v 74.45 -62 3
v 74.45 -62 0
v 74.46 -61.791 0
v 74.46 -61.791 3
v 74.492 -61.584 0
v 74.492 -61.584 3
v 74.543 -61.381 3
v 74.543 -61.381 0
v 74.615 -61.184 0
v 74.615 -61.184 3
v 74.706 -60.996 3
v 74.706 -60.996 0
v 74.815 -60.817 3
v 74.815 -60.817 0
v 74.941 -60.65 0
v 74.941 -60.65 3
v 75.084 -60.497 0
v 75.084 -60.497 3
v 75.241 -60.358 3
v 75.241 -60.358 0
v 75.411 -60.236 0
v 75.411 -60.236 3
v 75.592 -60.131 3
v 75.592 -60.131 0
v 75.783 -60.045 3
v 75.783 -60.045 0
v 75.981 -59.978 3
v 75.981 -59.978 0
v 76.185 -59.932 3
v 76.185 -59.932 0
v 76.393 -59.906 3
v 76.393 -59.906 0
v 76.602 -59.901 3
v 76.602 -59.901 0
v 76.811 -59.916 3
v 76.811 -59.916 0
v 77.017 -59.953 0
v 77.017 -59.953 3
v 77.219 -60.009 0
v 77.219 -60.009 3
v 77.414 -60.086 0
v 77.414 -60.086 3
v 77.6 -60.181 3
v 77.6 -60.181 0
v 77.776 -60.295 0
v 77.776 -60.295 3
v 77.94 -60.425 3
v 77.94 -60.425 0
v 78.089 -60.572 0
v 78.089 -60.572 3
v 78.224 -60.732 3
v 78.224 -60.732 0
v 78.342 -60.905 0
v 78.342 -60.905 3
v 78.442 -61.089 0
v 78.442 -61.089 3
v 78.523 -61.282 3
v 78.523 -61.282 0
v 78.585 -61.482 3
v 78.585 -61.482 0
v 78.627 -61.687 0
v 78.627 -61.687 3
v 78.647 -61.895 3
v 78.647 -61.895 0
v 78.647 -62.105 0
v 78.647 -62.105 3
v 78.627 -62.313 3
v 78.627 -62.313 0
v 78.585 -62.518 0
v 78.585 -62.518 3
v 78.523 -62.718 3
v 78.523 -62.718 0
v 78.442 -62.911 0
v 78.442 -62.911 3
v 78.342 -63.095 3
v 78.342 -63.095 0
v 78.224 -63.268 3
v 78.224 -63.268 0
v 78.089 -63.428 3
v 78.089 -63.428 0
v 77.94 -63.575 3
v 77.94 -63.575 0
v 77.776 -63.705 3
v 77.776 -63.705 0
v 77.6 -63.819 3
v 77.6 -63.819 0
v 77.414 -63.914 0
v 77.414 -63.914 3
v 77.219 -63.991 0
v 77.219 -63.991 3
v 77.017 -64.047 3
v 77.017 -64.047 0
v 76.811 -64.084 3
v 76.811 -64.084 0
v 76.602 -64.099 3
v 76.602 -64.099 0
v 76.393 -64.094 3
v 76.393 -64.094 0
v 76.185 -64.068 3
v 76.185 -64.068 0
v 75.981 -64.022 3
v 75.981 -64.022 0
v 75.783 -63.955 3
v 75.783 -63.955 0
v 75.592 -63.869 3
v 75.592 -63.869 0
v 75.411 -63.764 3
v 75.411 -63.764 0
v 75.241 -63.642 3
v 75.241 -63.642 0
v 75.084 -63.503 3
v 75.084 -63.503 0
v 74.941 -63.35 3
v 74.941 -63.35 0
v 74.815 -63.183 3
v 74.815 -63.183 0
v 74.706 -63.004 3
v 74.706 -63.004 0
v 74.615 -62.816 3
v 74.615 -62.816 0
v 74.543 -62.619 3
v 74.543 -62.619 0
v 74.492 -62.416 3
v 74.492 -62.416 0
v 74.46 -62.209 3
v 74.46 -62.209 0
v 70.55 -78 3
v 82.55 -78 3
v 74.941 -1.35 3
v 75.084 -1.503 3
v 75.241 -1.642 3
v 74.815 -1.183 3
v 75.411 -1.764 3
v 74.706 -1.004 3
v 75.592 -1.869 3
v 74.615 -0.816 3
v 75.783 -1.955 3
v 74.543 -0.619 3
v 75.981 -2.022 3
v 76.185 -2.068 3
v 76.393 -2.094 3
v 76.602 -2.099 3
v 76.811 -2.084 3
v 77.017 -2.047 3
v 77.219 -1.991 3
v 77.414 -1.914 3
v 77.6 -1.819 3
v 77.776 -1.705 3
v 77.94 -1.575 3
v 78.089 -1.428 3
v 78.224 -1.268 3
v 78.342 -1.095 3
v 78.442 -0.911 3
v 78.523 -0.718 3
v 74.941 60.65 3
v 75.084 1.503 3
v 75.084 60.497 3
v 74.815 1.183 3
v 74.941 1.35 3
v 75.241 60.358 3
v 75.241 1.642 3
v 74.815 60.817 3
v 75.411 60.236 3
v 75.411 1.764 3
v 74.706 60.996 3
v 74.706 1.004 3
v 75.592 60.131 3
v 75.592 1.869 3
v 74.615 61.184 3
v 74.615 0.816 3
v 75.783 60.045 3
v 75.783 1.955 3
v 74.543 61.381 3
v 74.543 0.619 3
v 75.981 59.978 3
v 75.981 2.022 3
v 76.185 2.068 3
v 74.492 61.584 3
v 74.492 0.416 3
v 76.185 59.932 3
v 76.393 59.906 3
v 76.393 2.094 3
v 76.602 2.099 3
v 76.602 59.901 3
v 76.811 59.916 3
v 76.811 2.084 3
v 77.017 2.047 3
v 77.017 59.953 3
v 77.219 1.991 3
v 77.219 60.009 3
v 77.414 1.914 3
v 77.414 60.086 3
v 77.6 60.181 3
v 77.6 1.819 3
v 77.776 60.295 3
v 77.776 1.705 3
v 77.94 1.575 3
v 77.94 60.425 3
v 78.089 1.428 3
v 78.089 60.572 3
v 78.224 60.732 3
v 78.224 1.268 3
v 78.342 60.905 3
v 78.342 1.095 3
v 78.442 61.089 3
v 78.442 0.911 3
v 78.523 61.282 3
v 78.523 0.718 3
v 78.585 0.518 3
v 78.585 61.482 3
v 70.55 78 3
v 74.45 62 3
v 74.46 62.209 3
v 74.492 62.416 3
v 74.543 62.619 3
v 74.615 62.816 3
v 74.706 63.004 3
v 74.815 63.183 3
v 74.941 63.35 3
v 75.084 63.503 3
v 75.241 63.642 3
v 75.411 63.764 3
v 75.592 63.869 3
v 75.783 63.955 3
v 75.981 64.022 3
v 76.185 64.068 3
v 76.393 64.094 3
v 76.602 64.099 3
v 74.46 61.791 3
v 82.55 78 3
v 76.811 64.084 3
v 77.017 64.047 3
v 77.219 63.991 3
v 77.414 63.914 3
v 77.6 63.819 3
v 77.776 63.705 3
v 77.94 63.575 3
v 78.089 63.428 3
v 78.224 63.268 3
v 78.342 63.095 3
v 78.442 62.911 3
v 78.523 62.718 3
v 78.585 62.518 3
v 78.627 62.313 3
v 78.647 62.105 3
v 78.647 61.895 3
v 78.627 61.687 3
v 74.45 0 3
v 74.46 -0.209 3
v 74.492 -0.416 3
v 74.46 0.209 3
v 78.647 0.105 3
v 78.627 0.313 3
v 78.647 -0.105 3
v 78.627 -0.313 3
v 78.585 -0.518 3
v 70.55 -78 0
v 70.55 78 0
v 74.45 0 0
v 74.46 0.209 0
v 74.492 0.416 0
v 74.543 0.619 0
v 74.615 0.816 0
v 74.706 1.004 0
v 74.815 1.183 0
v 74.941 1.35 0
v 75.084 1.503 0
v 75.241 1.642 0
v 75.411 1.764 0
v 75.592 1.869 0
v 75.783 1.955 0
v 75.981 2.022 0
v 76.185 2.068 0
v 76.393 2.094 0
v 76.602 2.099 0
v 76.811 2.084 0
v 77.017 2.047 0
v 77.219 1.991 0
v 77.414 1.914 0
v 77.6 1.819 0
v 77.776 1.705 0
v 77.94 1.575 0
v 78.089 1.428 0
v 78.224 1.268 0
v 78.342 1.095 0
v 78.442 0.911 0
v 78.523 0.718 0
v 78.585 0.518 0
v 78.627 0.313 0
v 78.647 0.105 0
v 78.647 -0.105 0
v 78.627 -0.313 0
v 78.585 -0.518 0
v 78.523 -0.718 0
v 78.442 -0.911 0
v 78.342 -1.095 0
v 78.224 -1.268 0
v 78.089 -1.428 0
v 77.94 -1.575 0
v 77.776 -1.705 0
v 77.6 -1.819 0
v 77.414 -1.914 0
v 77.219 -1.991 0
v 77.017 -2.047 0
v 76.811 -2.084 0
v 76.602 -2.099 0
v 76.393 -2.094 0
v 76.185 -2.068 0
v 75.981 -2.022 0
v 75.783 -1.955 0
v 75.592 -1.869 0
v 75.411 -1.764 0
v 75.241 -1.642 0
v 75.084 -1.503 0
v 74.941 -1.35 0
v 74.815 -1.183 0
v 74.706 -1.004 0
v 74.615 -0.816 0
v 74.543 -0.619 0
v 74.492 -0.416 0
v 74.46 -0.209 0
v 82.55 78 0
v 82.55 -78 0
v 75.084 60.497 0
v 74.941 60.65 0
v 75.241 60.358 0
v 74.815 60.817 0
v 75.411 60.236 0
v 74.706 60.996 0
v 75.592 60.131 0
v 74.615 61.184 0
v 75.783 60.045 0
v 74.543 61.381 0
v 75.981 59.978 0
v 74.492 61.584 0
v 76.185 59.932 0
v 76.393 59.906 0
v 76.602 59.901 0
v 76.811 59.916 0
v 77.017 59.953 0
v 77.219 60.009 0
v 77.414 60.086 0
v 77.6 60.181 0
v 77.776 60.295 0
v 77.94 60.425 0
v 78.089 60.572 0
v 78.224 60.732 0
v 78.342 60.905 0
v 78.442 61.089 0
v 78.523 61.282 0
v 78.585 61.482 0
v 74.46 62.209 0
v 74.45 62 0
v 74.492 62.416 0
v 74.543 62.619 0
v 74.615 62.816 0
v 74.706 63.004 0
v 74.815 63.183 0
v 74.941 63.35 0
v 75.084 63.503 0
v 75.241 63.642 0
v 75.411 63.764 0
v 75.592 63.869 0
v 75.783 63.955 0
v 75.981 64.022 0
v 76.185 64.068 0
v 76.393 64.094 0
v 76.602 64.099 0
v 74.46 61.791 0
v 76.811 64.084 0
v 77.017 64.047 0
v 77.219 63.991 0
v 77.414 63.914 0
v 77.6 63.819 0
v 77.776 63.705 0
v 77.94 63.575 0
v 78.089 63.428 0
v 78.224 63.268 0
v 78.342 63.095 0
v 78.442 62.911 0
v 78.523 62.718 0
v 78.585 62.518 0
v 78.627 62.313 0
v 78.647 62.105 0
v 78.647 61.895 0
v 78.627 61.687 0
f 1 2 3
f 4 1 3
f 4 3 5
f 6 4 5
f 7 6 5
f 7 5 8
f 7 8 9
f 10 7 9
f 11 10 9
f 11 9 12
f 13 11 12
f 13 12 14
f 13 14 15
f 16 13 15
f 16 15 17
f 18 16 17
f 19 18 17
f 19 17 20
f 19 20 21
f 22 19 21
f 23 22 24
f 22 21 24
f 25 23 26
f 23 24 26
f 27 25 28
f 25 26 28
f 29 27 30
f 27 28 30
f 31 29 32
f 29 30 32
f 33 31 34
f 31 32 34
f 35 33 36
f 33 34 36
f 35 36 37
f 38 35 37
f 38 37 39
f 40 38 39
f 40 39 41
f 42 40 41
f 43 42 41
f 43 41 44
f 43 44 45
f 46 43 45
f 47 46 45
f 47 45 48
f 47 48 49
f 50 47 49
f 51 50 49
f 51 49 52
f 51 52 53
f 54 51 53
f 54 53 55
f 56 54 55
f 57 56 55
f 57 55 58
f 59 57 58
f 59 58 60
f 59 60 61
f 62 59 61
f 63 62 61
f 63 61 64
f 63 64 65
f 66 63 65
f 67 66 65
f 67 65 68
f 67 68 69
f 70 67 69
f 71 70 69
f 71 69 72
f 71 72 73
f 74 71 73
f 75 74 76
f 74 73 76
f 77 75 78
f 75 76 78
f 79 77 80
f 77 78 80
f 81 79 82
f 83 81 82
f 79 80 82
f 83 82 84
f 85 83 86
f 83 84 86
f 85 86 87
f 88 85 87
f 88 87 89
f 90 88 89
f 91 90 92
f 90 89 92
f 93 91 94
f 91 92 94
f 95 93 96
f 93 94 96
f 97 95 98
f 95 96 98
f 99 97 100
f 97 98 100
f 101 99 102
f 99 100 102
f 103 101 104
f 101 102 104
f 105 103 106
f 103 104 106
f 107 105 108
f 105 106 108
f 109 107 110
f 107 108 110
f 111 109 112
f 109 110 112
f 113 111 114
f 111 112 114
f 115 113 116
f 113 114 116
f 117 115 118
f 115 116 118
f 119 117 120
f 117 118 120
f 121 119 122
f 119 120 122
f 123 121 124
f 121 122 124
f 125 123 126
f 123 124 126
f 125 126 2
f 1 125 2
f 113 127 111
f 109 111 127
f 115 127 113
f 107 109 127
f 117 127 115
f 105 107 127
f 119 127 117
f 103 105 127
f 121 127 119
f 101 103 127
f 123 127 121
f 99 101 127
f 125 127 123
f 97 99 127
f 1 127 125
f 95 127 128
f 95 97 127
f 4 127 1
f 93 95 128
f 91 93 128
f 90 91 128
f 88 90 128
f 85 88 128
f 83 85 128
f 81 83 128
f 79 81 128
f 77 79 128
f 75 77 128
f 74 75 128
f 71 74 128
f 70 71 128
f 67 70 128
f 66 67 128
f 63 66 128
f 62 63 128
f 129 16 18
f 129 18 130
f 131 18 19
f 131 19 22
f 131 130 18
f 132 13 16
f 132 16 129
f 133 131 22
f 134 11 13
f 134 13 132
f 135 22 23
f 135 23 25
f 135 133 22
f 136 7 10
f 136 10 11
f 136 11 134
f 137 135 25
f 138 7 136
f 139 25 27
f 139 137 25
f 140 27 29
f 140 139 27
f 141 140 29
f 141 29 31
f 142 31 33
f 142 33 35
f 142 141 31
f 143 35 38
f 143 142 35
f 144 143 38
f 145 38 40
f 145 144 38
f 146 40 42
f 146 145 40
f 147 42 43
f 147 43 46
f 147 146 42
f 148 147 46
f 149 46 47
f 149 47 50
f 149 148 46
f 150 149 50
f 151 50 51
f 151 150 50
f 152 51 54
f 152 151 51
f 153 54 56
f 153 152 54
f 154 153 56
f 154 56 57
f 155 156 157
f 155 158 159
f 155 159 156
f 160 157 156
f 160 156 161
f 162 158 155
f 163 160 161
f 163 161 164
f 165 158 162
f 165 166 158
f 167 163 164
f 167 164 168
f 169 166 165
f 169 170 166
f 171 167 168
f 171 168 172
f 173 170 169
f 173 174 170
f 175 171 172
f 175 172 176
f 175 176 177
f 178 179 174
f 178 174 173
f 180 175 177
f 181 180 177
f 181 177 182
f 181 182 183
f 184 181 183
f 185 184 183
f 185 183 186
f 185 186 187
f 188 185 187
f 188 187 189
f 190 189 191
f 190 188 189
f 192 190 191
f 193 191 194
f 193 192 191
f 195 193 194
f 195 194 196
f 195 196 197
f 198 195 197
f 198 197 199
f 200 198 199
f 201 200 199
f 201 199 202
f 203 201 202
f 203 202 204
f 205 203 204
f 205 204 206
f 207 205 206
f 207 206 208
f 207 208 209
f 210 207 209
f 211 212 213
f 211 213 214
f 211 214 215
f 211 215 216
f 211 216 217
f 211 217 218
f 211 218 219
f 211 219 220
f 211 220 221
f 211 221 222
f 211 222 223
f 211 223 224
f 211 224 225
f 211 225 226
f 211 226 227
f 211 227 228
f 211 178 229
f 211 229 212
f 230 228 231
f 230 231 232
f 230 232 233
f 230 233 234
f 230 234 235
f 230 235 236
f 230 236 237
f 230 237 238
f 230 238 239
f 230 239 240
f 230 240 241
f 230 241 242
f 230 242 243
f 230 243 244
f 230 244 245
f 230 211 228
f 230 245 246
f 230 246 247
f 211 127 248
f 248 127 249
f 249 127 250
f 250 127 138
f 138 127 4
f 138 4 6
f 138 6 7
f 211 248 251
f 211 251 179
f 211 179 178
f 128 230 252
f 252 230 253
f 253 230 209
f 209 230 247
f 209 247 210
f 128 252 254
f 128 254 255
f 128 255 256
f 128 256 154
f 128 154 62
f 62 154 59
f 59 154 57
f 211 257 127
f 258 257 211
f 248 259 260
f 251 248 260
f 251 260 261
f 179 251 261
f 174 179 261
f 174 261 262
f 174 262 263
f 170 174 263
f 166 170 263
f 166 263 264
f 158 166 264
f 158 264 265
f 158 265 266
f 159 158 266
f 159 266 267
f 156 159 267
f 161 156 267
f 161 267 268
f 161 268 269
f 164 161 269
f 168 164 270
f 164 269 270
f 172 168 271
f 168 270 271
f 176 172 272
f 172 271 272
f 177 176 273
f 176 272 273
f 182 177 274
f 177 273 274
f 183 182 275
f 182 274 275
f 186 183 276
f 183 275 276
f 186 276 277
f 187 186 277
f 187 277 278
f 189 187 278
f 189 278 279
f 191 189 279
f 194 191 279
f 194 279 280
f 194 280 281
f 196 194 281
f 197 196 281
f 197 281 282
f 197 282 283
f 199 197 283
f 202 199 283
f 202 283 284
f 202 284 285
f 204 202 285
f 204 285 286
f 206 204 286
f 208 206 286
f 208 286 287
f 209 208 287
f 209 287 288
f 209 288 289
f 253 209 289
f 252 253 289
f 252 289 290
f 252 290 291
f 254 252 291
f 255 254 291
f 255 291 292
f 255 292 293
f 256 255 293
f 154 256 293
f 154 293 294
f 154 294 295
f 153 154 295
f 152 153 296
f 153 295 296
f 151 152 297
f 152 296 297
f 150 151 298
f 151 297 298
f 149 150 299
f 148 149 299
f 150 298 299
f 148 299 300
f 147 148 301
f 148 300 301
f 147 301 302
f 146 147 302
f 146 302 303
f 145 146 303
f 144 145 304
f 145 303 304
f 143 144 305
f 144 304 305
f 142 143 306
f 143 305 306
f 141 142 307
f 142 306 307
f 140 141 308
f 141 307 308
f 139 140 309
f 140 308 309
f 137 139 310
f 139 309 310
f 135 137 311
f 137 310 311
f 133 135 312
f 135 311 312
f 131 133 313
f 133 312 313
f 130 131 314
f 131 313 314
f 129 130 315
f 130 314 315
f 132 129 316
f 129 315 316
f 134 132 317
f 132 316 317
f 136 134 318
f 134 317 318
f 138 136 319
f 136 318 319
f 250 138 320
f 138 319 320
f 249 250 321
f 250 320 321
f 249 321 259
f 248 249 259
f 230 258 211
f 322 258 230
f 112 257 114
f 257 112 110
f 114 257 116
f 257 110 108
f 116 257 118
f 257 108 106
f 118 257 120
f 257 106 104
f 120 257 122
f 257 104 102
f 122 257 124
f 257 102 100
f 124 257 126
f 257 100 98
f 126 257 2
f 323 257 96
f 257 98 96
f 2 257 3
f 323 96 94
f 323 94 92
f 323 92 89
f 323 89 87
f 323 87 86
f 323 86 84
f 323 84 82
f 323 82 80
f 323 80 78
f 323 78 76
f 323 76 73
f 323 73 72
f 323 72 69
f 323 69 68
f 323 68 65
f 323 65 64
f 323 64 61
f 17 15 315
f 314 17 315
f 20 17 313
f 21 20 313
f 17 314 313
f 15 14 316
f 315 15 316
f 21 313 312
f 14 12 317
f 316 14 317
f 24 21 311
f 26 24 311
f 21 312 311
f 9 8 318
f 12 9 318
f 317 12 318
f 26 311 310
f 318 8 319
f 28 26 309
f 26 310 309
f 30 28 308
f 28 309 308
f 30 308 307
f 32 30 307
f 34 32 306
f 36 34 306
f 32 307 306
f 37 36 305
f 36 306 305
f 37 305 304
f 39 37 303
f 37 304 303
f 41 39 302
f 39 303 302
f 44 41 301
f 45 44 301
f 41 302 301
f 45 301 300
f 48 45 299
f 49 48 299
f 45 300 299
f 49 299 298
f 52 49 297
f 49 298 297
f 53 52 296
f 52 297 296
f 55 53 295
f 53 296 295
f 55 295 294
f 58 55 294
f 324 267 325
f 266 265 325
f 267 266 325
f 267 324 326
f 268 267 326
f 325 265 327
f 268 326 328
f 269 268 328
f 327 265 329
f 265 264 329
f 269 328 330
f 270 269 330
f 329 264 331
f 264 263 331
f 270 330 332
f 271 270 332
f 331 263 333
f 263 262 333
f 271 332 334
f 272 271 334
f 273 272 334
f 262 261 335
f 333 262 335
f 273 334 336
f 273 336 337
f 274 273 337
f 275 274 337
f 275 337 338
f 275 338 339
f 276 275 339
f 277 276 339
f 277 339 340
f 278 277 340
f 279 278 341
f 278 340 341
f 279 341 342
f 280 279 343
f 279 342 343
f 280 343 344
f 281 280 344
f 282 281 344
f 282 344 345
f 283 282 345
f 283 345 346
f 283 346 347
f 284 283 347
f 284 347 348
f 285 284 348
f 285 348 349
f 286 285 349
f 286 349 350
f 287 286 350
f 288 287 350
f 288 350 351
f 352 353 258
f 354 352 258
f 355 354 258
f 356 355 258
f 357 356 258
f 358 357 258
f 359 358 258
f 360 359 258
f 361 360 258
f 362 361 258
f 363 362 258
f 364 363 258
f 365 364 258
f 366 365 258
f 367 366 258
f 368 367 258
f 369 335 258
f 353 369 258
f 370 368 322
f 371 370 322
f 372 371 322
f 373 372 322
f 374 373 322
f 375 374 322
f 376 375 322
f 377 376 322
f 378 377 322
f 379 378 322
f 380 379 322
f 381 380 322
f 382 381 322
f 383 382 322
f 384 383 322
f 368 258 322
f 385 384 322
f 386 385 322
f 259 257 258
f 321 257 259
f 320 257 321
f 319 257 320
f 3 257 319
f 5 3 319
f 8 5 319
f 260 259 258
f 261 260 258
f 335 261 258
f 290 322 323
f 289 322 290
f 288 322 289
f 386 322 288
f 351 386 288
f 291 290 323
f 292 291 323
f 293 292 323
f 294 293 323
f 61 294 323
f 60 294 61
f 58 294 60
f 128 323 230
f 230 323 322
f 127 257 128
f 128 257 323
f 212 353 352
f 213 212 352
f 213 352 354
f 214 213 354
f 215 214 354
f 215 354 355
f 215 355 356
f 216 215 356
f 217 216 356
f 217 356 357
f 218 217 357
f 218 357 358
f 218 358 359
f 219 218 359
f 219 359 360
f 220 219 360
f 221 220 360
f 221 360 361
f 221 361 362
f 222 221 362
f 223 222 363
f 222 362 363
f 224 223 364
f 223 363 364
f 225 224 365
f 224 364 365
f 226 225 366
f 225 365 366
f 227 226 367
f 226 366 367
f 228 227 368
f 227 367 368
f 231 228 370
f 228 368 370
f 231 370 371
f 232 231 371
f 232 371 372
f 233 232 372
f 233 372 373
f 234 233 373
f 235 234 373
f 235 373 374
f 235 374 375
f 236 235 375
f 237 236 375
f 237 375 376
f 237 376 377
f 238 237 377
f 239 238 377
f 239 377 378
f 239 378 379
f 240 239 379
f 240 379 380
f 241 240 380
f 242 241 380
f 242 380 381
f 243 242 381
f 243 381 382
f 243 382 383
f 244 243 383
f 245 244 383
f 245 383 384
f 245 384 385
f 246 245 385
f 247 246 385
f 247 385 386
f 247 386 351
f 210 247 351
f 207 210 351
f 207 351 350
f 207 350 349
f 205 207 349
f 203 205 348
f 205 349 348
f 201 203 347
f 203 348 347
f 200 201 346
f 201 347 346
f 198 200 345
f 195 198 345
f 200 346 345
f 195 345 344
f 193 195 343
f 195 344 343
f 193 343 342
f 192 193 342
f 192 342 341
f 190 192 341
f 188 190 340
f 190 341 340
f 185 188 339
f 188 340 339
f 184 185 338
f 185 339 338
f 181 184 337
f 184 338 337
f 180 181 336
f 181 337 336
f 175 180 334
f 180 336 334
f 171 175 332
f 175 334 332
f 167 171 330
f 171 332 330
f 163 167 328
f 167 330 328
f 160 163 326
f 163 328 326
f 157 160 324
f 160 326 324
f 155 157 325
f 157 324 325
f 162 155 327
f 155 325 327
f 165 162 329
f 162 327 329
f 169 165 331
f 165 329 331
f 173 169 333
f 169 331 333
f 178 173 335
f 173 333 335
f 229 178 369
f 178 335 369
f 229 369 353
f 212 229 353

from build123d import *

# Parameters (mm, degrees)
SKETCH1_W           = 12
SKETCH1_H           = 156
BOSS_EXTRUDE1_DEPTH = 3
CUT_EXTRUDE1_REACH  = 115.611
SKETCH2_R           = 2.1


with BuildPart() as part:
    # Sketch1 → Boss-Extrude1 (new body)
    with BuildSketch(Plane.XY):
        with Locations((76.55, 0)):
            Rectangle(SKETCH1_W, SKETCH1_H)
    extrude(amount=BOSS_EXTRUDE1_DEPTH)

    # Sketch2 → Cut-Extrude1 (cut, up to next)
    with BuildSketch(Plane(origin=(0, 0, 0), x_dir=(-1, 0, 0), z_dir=(0, 0, -1)), mode=Mode.PRIVATE) as cut_extrude1_sk1:
        with Locations((-76.55, -62)):
            Circle(SKETCH2_R)
    cut_extrude1_tool1 = extrude(cut_extrude1_sk1.sketch, amount=-CUT_EXTRUDE1_REACH, mode=Mode.PRIVATE) & part.part
    # Sketch2 → Cut-Extrude1 (cut, up to next)
    with BuildSketch(Plane(origin=(0, 0, 0), x_dir=(-1, 0, 0), z_dir=(0, 0, -1)), mode=Mode.PRIVATE) as cut_extrude1_sk2:
        with Locations((-76.55, 0)):
            Circle(SKETCH2_R)
    cut_extrude1_tool2 = extrude(cut_extrude1_sk2.sketch, amount=-CUT_EXTRUDE1_REACH, mode=Mode.PRIVATE) & part.part
    # Sketch2 → Cut-Extrude1 (cut, up to next)
    with BuildSketch(Plane(origin=(0, 0, 0), x_dir=(-1, 0, 0), z_dir=(0, 0, -1)), mode=Mode.PRIVATE) as cut_extrude1_sk3:
        with Locations((-76.55, 62)):
            Circle(SKETCH2_R)
    cut_extrude1_tool3 = extrude(cut_extrude1_sk3.sketch, amount=-CUT_EXTRUDE1_REACH, mode=Mode.PRIVATE) & part.part
    add(cut_extrude1_tool1.solids().sort_by_distance((76.55, -62, 0))[0], mode=Mode.SUBTRACT)
    add(cut_extrude1_tool2.solids().sort_by_distance((76.55, 0, 0))[0], mode=Mode.SUBTRACT)
    add(cut_extrude1_tool3.solids().sort_by_distance((76.55, 62, 0))[0], mode=Mode.SUBTRACT)


solid = part.part
